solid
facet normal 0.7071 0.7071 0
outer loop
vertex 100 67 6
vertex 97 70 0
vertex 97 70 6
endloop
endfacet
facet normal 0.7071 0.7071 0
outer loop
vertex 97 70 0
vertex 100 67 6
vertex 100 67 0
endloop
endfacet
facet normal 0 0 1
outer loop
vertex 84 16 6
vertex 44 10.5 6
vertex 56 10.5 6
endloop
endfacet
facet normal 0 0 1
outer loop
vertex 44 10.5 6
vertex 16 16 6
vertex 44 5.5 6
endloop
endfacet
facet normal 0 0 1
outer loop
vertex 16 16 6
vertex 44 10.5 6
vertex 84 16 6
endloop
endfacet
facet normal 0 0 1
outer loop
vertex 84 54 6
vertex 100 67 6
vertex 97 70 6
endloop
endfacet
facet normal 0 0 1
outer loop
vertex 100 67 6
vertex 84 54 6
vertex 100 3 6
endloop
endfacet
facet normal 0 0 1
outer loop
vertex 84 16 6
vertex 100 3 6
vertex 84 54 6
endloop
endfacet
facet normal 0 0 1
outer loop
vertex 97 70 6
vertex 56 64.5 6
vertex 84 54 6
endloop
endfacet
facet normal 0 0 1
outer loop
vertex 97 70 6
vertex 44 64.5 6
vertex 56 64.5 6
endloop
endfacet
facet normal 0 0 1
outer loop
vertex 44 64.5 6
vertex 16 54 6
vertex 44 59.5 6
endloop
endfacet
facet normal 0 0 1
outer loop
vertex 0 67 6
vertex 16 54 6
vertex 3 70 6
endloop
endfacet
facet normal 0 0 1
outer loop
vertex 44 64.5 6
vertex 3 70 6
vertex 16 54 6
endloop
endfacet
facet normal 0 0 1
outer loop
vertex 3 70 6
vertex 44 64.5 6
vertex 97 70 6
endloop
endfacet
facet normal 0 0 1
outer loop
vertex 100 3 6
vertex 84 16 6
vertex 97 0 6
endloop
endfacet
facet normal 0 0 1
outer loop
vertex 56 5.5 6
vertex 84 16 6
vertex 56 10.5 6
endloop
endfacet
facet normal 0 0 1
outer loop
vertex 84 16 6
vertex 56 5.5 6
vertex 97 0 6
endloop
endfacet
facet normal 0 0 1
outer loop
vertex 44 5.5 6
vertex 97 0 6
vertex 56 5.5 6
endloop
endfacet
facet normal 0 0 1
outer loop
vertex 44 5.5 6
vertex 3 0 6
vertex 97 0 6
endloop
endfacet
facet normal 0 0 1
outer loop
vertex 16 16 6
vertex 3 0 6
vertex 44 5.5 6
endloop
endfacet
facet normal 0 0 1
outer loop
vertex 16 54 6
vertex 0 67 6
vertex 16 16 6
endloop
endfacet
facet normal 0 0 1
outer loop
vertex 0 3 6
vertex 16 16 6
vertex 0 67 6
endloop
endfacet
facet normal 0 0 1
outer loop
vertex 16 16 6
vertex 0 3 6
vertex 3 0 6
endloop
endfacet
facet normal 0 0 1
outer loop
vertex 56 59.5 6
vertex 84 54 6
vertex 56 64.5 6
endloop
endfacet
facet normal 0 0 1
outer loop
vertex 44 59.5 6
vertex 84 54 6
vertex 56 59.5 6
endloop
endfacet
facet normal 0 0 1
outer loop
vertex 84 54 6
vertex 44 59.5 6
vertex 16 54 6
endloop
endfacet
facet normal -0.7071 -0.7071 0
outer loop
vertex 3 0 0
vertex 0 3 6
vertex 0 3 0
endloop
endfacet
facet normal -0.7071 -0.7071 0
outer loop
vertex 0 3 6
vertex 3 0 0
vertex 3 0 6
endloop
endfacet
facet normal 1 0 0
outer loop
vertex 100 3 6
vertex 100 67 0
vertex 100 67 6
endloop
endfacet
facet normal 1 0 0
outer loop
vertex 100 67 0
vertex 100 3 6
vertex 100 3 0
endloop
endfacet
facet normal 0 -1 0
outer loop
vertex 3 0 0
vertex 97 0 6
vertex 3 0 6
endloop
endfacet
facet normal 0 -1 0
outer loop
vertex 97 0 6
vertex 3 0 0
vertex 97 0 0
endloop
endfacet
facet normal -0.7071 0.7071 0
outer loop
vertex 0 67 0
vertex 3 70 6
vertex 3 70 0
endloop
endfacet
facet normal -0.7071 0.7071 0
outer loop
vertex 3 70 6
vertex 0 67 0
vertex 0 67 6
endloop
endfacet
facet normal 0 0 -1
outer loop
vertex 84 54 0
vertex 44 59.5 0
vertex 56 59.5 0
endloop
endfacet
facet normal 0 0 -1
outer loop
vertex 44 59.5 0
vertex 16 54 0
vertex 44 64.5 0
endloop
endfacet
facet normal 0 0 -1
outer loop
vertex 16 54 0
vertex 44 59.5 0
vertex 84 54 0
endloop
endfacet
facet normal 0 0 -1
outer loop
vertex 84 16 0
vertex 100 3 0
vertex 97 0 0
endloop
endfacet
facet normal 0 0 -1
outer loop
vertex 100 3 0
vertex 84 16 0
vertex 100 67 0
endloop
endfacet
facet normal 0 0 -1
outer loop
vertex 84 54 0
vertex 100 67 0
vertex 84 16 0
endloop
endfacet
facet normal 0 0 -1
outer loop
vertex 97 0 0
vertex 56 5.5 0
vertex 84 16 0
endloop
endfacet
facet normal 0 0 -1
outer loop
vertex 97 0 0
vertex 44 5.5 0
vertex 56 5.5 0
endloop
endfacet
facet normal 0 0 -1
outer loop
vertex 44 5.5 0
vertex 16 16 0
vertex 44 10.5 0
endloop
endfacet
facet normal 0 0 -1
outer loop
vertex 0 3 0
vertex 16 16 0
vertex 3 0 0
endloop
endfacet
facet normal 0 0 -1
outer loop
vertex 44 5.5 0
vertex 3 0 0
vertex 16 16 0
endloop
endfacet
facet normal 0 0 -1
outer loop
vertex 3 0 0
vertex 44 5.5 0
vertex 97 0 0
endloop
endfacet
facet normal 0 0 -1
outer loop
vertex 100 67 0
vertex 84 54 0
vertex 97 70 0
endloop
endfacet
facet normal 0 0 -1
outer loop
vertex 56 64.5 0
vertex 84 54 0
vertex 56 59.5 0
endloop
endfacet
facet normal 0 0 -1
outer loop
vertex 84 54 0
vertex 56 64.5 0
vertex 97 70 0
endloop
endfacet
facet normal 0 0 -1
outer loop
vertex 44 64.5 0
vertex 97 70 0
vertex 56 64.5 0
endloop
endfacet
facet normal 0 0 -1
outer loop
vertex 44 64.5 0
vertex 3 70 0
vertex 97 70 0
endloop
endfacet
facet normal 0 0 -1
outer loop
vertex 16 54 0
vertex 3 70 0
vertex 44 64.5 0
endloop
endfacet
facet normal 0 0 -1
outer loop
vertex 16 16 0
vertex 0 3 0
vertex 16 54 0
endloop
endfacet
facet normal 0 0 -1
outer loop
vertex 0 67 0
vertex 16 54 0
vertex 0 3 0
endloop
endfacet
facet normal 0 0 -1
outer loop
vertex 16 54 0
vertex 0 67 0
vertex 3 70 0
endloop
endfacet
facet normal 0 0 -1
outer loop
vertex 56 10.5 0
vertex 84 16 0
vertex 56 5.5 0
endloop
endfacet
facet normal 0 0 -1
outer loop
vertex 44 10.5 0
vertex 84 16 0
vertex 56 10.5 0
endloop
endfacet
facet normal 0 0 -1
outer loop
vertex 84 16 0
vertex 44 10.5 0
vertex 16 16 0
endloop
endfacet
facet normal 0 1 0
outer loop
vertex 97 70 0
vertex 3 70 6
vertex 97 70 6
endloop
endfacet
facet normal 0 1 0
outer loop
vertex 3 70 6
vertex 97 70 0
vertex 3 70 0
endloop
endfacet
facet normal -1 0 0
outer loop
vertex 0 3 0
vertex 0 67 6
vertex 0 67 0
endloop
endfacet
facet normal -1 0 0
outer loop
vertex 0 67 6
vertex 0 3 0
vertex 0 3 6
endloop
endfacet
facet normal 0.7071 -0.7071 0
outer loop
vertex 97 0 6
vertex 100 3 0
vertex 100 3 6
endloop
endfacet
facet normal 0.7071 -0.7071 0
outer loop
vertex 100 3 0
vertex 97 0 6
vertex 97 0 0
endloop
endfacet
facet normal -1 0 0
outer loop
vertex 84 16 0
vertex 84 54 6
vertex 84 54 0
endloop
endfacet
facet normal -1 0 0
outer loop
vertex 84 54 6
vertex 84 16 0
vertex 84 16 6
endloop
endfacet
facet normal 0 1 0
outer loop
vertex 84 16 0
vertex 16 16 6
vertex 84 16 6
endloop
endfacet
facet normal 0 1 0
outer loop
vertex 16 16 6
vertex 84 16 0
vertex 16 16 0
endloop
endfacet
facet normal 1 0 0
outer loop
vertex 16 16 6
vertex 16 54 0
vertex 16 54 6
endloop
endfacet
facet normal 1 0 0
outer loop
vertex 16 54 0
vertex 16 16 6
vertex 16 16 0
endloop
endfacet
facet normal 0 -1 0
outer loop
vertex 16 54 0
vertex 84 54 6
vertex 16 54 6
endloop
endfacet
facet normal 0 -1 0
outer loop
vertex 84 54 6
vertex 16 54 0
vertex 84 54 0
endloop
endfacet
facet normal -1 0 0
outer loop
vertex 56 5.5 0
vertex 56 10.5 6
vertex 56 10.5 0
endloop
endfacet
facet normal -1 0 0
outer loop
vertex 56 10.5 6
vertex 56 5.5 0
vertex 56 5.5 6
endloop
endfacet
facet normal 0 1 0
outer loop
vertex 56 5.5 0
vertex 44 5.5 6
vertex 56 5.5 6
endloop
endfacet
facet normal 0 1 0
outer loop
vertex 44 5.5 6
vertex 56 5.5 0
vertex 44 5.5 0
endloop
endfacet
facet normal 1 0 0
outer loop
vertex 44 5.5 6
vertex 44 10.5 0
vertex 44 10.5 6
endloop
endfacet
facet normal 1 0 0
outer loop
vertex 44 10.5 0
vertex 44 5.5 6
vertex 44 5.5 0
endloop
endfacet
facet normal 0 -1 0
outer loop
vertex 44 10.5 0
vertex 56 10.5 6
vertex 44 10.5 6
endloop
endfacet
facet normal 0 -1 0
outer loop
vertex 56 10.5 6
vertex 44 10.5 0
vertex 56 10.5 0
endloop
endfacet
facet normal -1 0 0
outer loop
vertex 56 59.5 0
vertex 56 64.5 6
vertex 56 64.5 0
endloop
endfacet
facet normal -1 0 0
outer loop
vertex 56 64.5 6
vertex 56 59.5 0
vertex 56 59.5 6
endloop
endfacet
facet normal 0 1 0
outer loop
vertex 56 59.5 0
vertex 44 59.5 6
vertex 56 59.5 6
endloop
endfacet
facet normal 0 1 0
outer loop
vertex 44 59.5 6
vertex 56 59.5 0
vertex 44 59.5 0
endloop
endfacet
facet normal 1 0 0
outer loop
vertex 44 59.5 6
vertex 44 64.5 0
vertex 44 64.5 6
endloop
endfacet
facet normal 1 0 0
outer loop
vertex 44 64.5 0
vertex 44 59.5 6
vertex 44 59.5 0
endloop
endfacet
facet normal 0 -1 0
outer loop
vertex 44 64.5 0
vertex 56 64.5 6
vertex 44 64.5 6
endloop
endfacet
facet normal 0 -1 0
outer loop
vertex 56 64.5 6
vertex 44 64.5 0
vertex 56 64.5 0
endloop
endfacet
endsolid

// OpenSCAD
$fn = 32;

// ----------------------------------------------------------------------
// Frame plate: 100 x 70 frame, 16 mm rails
// ----------------------------------------------------------------------

// --- parameters (mm) ---
plate_l = 100;            // plate length, X
plate_w = 70;             // plate width, Y
plate_t = 6;              // plate thickness, Z (extrusion height)
corner_c = 3;             // corner chamfer
frame_bar = 16;           // frame rail width
slot_l = 12;              // adjustment slot length
slot_w = 5;               // adjustment slot width

win_l = plate_l - 2 * frame_bar;  // window length
win_w = plate_w - 2 * frame_bar;  // window width

profile = [[3, 0], [97, 0], [100, 3], [100, 67], [97, 70], [3, 70], [0, 67], [0, 3]];  // primary outline, 8 points, counter clockwise
void_1 = [[16, 16], [84, 16], [84, 54], [16, 54]];  // the window, 4 points
void_2 = [[44, 5.5], [56, 5.5], [56, 10.5], [44, 10.5]];  // adjustment slot, 4 points
void_3 = [[44, 59.5], [56, 59.5], [56, 64.5], [44, 64.5]];  // adjustment slot, 4 points

// --- the one profile operation ---
difference() {
  linear_extrude(height = plate_t) polygon(points = profile);
  translate([0, 0, -1])
    linear_extrude(height = plate_t + 2) polygon(points = void_1);
  translate([0, 0, -1])
    linear_extrude(height = plate_t + 2) polygon(points = void_2);
  translate([0, 0, -1])
    linear_extrude(height = plate_t + 2) polygon(points = void_3);
}
